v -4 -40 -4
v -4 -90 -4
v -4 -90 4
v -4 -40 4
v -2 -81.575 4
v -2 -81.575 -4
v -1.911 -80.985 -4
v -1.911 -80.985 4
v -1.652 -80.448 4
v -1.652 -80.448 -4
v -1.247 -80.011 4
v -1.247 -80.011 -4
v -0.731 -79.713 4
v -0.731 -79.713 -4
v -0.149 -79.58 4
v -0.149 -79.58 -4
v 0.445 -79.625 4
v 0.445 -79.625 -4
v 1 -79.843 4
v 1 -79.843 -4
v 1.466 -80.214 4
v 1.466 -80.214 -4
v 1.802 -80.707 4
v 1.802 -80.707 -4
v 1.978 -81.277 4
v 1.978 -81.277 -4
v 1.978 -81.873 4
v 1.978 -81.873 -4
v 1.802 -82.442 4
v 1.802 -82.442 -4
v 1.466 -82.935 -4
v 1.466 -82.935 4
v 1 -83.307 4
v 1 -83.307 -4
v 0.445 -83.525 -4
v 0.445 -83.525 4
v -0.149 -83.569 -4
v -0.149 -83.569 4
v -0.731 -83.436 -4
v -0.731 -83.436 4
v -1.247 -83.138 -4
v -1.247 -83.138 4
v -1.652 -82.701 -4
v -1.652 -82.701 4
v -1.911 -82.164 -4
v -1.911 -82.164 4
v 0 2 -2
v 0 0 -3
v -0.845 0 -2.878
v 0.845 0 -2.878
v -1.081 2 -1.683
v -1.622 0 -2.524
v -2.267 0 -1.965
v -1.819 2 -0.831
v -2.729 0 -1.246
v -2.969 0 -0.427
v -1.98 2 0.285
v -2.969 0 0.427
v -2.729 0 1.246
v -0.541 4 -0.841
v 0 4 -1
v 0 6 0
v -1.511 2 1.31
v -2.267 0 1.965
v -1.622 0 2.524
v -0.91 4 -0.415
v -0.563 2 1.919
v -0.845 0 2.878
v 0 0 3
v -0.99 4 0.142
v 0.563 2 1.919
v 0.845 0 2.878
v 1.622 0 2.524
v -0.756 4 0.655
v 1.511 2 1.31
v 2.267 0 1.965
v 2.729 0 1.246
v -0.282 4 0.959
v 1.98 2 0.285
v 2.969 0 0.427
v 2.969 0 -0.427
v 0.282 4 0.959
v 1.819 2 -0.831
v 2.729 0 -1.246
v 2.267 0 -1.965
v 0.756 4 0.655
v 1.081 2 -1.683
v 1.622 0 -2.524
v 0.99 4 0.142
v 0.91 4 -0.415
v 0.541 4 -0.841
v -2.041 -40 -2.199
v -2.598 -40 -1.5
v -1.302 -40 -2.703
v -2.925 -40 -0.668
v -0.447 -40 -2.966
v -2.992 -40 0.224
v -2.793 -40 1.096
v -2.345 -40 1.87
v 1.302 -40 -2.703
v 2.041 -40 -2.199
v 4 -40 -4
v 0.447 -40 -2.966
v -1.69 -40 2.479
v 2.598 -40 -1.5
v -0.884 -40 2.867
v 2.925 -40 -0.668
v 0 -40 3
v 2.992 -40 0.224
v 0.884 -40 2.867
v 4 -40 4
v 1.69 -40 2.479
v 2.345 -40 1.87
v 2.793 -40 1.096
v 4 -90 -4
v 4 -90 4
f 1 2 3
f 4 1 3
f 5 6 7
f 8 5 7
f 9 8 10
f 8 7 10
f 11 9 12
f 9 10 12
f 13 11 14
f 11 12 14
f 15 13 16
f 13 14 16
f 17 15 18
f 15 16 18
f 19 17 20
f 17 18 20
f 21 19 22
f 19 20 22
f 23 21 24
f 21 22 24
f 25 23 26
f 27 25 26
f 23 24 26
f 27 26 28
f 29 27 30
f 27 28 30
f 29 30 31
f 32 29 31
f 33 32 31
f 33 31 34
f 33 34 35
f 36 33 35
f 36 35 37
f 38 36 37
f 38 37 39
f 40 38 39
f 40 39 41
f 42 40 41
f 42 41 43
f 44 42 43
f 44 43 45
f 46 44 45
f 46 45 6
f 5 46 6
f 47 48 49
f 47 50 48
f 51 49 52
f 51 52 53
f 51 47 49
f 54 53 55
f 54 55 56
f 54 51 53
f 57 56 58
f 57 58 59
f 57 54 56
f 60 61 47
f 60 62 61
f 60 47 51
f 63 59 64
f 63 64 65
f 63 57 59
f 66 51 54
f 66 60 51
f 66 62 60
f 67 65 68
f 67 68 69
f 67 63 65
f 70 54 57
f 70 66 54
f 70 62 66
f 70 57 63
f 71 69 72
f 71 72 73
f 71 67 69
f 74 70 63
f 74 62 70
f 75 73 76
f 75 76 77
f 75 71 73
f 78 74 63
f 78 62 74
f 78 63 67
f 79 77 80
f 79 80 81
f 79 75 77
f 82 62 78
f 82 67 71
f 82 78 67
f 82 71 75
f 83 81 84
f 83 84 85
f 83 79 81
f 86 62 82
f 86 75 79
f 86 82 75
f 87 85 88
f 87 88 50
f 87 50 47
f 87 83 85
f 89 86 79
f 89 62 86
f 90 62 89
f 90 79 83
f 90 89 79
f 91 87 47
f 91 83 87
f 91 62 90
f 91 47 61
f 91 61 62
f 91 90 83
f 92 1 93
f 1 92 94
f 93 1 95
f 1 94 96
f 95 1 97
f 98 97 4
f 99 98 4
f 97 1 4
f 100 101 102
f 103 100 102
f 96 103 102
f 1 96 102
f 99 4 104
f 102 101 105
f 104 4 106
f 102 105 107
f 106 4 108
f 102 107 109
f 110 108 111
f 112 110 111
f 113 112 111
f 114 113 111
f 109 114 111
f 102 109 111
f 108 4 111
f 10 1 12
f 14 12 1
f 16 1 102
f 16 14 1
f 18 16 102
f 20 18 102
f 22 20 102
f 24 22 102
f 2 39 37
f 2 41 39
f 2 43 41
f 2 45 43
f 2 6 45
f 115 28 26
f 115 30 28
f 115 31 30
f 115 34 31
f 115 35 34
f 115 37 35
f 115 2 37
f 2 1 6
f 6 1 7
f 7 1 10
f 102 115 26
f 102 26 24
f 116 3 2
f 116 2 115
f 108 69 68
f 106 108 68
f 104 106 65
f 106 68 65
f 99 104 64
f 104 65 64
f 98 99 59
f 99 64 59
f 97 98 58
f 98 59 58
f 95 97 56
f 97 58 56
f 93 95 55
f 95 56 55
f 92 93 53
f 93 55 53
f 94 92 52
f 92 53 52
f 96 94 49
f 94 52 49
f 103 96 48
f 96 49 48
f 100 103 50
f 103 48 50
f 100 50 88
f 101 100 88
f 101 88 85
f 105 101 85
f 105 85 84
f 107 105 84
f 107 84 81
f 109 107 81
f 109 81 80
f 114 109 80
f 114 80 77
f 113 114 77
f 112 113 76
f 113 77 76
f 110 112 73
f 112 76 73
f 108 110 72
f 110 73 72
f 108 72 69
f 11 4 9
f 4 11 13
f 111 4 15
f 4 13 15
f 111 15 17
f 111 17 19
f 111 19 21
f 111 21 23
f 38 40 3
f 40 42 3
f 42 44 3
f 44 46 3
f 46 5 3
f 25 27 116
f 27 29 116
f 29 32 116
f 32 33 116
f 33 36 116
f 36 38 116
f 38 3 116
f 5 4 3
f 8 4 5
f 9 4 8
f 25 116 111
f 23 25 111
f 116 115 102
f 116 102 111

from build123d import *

# Parameters (mm, degrees)
ESQUISSE2_R             = 3
BOSS_EXTRU_1_DEPTH      = 90
ESQUISSE3_W             = 8
ESQUISSE3_H             = 8
BOSS_EXTRU_2_DEPTH      = 50
ESQUISSE8_R             = 2
ENL_V_MAT_EXTRU_4_DEPTH = 10


with BuildPart() as part:
    # Esquisse1 → Révolution1 (revolve)
    with BuildSketch(Plane.XY, mode=Mode.PRIVATE) as r_volution1_sk:
        Polygon((0, 0), (3, 0), (0, 6), align=None)
    revolve(r_volution1_sk.sketch.rotate(Axis((0, 0, 0), (0, 1, 0)), 90), axis=Axis((0, 0, 0), (0, 1, 0)))

    # Esquisse2 → Boss.-Extru.1 (add)
    with BuildSketch(Plane.XZ):
        with Locations(Location((0, 0, 0), (0, 0, 90))):
            Circle(ESQUISSE2_R)
    extrude(amount=BOSS_EXTRU_1_DEPTH)

    # Esquisse3 → Boss.-Extru.2 (add)
    with BuildSketch(Plane.XZ.offset(90)):
        Rectangle(ESQUISSE3_W, ESQUISSE3_H)
    extrude(amount=-BOSS_EXTRU_2_DEPTH)

    # Esquisse8 → Enlèv. mat.-Extru.4 (cut)
    with BuildSketch(Plane(origin=(0, 0, -4), x_dir=(-1, 0, 0), z_dir=(0, 0, -1))):
        with Locations((0, -81.574730925)):
            Circle(ESQUISSE8_R)
    extrude(amount=-ENL_V_MAT_EXTRU_4_DEPTH, mode=Mode.SUBTRACT)


solid = part.part
